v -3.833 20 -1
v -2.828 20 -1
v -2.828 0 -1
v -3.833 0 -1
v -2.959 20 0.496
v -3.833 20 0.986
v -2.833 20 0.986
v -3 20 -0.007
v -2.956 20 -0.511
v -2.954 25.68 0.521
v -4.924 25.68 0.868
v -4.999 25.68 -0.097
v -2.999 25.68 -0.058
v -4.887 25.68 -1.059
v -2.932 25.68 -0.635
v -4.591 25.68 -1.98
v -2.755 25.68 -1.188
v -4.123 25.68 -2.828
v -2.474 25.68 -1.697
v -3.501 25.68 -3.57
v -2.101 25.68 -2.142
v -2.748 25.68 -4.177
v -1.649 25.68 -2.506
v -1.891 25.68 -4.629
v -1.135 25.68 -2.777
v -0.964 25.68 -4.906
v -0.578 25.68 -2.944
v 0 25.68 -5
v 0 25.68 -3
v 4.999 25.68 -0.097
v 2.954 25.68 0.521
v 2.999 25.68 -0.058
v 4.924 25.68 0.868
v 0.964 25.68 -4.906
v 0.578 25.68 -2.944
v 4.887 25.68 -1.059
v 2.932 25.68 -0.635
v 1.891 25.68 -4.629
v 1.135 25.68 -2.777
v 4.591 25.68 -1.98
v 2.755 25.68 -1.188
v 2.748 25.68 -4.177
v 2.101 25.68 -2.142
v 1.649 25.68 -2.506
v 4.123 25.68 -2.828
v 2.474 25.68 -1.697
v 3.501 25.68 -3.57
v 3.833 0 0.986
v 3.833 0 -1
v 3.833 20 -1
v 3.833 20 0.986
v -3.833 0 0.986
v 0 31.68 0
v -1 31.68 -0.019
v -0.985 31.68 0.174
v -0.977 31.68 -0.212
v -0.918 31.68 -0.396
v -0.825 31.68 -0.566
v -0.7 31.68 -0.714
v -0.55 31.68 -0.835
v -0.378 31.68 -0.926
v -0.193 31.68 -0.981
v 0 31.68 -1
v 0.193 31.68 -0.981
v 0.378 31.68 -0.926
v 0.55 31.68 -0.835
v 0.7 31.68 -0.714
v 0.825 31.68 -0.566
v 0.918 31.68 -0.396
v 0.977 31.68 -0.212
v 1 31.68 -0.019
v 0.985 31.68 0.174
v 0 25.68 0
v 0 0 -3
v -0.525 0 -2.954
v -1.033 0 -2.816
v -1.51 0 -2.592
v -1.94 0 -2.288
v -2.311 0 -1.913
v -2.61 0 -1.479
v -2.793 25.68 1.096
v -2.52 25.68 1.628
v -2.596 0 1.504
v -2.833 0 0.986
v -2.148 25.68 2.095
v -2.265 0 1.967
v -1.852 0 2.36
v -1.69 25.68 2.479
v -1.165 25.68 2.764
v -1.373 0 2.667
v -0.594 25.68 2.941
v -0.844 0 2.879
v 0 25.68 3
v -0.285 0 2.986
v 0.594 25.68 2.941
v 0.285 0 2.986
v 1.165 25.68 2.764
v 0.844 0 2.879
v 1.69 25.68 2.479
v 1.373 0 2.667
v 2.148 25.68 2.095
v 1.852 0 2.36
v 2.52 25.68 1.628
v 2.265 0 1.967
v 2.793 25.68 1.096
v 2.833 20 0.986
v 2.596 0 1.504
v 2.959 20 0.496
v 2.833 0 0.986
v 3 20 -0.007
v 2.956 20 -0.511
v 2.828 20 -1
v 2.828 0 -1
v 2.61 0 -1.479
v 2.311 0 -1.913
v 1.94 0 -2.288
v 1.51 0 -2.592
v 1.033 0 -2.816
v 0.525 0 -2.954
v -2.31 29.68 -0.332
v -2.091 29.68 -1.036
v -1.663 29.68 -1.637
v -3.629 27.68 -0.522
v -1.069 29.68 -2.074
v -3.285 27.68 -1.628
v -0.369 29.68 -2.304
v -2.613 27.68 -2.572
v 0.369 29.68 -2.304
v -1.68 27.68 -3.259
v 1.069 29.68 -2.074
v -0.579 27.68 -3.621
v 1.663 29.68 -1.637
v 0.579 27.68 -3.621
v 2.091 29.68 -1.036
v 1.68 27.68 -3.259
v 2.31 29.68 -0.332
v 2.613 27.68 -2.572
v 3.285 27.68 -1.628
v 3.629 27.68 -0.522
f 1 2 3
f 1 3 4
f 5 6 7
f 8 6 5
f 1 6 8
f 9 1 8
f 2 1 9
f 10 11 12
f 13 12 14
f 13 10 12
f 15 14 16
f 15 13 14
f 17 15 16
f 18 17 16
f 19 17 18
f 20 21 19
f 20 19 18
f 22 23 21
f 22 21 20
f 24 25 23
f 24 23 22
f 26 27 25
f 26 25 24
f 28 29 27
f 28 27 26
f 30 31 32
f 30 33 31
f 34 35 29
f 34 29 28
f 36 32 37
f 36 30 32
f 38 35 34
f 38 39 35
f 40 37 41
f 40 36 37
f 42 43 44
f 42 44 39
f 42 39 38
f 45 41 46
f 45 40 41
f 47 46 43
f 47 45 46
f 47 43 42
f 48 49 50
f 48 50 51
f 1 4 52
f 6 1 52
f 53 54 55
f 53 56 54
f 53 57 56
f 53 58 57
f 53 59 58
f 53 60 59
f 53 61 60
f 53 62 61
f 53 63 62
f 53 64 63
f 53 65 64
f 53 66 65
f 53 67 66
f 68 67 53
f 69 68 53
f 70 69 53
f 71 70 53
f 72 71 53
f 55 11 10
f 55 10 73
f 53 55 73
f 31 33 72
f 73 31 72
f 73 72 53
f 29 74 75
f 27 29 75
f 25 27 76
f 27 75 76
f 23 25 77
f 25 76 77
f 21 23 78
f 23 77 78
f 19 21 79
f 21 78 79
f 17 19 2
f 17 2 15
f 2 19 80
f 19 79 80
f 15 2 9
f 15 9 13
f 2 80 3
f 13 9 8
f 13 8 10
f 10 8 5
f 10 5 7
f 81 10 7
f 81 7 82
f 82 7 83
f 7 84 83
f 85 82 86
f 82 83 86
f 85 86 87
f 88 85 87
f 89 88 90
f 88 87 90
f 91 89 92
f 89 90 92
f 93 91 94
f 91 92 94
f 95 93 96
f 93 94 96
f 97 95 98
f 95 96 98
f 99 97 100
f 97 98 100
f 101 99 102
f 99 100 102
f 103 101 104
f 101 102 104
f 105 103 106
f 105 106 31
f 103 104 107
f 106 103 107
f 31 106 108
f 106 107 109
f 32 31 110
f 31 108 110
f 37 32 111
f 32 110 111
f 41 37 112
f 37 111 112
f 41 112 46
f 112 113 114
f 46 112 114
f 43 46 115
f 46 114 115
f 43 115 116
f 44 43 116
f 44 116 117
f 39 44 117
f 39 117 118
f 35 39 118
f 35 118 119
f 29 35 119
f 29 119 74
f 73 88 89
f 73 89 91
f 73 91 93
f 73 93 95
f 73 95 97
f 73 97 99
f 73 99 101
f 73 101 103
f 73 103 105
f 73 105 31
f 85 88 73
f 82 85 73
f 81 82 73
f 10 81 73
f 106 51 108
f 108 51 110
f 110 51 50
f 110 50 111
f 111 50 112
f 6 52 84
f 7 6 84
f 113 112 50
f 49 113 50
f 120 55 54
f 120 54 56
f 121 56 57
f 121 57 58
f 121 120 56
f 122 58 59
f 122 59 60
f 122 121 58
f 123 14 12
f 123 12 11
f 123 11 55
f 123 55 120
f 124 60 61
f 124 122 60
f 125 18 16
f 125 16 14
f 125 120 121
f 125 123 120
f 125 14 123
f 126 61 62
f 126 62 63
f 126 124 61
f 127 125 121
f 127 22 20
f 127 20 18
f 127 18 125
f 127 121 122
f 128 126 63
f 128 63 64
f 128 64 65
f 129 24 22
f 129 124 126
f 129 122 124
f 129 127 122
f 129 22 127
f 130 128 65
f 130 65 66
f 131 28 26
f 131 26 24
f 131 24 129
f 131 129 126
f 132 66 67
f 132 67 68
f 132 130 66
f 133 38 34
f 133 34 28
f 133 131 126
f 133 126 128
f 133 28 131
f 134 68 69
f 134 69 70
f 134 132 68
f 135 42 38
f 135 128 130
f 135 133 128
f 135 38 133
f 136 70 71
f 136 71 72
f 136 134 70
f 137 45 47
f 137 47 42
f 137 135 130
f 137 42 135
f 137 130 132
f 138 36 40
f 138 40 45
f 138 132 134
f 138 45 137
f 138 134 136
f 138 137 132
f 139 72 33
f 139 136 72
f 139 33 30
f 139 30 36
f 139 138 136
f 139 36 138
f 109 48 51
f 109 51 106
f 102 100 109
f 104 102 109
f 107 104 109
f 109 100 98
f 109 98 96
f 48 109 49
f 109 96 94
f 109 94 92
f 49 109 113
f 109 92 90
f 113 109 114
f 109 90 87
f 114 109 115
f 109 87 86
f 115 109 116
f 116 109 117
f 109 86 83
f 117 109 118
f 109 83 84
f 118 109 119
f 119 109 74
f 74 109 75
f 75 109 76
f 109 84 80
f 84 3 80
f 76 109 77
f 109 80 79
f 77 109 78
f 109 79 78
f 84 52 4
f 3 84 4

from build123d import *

# Parameters (mm, degrees)
SKETCH1_R                = 3
BOSS_EXTRUDE1_DEPTH      = 25.68
REVOLVE1_ANGLE           = 100
REVOLVE1_OTHER_WAY_ANGLE = 100
BOSS_EXTRUDE2_DEPTH      = 20


with BuildPart() as part:
    # Sketch1 → Boss-Extrude1 (new body)
    with BuildSketch(Plane(origin=(0, 0, 0), x_dir=(1, 0, 0), z_dir=(0, 1, 0))):
        with Locations(Location((0, 0, 0), (0, 0, 90))):
            Circle(SKETCH1_R)
    extrude(amount=BOSS_EXTRUDE1_DEPTH)

    # Sketch3 → Revolve1 (revolve)
    with BuildSketch(Plane(origin=(0, 0, 0), x_dir=(0, 0, -1), z_dir=(1, 0, 0))):
        Polygon((1, 31.68), (5, 25.68), (0, 25.68), (0, 31.68), align=None)
    revolve(axis=Axis((0, 25.68, 0), (0, 1, 0)), revolution_arc=REVOLVE1_ANGLE)

    # Sketch3 → Revolve1 other way (revolve)
    with BuildSketch(Plane(origin=(0, 0, 0), x_dir=(0, 0, -1), z_dir=(1, 0, 0))):
        Polygon((1, 31.68), (5, 25.68), (0, 25.68), (0, 31.68), align=None)
    revolve(axis=Axis((0, 25.68, 0), (0, -1, 0)), revolution_arc=REVOLVE1_OTHER_WAY_ANGLE)

    # Sketch4 → Boss-Extrude2 (add)
    with BuildSketch(Plane(origin=(0, 0, 0), x_dir=(-1, 0, 0), z_dir=(0, -1, 0))):
        with BuildLine():
            ThreePointArc((2.833333333, -0.986013297), (2.999990846, 0.007411119), (2.828427125, 1))
            Line((2.828427125, 1), (3.833333333, 1))
            Line((3.833333333, 1), (3.833333333, -0.986013297))
            Line((3.833333333, -0.986013297), (2.833333333, -0.986013297))
        make_face()
        with BuildLine():
            Line((-3.833333333, -0.986013297), (-2.833333333, -0.986013297))
            ThreePointArc((-2.833333333, -0.986013297), (-2.999990846, 0.007411119), (-2.828427125, 1))
            Line((-2.828427125, 1), (-3.833333333, 1))
            Line((-3.833333333, 1), (-3.833333333, -0.986013297))
        make_face()
    extrude(amount=-BOSS_EXTRUDE2_DEPTH)


solid = part.part
